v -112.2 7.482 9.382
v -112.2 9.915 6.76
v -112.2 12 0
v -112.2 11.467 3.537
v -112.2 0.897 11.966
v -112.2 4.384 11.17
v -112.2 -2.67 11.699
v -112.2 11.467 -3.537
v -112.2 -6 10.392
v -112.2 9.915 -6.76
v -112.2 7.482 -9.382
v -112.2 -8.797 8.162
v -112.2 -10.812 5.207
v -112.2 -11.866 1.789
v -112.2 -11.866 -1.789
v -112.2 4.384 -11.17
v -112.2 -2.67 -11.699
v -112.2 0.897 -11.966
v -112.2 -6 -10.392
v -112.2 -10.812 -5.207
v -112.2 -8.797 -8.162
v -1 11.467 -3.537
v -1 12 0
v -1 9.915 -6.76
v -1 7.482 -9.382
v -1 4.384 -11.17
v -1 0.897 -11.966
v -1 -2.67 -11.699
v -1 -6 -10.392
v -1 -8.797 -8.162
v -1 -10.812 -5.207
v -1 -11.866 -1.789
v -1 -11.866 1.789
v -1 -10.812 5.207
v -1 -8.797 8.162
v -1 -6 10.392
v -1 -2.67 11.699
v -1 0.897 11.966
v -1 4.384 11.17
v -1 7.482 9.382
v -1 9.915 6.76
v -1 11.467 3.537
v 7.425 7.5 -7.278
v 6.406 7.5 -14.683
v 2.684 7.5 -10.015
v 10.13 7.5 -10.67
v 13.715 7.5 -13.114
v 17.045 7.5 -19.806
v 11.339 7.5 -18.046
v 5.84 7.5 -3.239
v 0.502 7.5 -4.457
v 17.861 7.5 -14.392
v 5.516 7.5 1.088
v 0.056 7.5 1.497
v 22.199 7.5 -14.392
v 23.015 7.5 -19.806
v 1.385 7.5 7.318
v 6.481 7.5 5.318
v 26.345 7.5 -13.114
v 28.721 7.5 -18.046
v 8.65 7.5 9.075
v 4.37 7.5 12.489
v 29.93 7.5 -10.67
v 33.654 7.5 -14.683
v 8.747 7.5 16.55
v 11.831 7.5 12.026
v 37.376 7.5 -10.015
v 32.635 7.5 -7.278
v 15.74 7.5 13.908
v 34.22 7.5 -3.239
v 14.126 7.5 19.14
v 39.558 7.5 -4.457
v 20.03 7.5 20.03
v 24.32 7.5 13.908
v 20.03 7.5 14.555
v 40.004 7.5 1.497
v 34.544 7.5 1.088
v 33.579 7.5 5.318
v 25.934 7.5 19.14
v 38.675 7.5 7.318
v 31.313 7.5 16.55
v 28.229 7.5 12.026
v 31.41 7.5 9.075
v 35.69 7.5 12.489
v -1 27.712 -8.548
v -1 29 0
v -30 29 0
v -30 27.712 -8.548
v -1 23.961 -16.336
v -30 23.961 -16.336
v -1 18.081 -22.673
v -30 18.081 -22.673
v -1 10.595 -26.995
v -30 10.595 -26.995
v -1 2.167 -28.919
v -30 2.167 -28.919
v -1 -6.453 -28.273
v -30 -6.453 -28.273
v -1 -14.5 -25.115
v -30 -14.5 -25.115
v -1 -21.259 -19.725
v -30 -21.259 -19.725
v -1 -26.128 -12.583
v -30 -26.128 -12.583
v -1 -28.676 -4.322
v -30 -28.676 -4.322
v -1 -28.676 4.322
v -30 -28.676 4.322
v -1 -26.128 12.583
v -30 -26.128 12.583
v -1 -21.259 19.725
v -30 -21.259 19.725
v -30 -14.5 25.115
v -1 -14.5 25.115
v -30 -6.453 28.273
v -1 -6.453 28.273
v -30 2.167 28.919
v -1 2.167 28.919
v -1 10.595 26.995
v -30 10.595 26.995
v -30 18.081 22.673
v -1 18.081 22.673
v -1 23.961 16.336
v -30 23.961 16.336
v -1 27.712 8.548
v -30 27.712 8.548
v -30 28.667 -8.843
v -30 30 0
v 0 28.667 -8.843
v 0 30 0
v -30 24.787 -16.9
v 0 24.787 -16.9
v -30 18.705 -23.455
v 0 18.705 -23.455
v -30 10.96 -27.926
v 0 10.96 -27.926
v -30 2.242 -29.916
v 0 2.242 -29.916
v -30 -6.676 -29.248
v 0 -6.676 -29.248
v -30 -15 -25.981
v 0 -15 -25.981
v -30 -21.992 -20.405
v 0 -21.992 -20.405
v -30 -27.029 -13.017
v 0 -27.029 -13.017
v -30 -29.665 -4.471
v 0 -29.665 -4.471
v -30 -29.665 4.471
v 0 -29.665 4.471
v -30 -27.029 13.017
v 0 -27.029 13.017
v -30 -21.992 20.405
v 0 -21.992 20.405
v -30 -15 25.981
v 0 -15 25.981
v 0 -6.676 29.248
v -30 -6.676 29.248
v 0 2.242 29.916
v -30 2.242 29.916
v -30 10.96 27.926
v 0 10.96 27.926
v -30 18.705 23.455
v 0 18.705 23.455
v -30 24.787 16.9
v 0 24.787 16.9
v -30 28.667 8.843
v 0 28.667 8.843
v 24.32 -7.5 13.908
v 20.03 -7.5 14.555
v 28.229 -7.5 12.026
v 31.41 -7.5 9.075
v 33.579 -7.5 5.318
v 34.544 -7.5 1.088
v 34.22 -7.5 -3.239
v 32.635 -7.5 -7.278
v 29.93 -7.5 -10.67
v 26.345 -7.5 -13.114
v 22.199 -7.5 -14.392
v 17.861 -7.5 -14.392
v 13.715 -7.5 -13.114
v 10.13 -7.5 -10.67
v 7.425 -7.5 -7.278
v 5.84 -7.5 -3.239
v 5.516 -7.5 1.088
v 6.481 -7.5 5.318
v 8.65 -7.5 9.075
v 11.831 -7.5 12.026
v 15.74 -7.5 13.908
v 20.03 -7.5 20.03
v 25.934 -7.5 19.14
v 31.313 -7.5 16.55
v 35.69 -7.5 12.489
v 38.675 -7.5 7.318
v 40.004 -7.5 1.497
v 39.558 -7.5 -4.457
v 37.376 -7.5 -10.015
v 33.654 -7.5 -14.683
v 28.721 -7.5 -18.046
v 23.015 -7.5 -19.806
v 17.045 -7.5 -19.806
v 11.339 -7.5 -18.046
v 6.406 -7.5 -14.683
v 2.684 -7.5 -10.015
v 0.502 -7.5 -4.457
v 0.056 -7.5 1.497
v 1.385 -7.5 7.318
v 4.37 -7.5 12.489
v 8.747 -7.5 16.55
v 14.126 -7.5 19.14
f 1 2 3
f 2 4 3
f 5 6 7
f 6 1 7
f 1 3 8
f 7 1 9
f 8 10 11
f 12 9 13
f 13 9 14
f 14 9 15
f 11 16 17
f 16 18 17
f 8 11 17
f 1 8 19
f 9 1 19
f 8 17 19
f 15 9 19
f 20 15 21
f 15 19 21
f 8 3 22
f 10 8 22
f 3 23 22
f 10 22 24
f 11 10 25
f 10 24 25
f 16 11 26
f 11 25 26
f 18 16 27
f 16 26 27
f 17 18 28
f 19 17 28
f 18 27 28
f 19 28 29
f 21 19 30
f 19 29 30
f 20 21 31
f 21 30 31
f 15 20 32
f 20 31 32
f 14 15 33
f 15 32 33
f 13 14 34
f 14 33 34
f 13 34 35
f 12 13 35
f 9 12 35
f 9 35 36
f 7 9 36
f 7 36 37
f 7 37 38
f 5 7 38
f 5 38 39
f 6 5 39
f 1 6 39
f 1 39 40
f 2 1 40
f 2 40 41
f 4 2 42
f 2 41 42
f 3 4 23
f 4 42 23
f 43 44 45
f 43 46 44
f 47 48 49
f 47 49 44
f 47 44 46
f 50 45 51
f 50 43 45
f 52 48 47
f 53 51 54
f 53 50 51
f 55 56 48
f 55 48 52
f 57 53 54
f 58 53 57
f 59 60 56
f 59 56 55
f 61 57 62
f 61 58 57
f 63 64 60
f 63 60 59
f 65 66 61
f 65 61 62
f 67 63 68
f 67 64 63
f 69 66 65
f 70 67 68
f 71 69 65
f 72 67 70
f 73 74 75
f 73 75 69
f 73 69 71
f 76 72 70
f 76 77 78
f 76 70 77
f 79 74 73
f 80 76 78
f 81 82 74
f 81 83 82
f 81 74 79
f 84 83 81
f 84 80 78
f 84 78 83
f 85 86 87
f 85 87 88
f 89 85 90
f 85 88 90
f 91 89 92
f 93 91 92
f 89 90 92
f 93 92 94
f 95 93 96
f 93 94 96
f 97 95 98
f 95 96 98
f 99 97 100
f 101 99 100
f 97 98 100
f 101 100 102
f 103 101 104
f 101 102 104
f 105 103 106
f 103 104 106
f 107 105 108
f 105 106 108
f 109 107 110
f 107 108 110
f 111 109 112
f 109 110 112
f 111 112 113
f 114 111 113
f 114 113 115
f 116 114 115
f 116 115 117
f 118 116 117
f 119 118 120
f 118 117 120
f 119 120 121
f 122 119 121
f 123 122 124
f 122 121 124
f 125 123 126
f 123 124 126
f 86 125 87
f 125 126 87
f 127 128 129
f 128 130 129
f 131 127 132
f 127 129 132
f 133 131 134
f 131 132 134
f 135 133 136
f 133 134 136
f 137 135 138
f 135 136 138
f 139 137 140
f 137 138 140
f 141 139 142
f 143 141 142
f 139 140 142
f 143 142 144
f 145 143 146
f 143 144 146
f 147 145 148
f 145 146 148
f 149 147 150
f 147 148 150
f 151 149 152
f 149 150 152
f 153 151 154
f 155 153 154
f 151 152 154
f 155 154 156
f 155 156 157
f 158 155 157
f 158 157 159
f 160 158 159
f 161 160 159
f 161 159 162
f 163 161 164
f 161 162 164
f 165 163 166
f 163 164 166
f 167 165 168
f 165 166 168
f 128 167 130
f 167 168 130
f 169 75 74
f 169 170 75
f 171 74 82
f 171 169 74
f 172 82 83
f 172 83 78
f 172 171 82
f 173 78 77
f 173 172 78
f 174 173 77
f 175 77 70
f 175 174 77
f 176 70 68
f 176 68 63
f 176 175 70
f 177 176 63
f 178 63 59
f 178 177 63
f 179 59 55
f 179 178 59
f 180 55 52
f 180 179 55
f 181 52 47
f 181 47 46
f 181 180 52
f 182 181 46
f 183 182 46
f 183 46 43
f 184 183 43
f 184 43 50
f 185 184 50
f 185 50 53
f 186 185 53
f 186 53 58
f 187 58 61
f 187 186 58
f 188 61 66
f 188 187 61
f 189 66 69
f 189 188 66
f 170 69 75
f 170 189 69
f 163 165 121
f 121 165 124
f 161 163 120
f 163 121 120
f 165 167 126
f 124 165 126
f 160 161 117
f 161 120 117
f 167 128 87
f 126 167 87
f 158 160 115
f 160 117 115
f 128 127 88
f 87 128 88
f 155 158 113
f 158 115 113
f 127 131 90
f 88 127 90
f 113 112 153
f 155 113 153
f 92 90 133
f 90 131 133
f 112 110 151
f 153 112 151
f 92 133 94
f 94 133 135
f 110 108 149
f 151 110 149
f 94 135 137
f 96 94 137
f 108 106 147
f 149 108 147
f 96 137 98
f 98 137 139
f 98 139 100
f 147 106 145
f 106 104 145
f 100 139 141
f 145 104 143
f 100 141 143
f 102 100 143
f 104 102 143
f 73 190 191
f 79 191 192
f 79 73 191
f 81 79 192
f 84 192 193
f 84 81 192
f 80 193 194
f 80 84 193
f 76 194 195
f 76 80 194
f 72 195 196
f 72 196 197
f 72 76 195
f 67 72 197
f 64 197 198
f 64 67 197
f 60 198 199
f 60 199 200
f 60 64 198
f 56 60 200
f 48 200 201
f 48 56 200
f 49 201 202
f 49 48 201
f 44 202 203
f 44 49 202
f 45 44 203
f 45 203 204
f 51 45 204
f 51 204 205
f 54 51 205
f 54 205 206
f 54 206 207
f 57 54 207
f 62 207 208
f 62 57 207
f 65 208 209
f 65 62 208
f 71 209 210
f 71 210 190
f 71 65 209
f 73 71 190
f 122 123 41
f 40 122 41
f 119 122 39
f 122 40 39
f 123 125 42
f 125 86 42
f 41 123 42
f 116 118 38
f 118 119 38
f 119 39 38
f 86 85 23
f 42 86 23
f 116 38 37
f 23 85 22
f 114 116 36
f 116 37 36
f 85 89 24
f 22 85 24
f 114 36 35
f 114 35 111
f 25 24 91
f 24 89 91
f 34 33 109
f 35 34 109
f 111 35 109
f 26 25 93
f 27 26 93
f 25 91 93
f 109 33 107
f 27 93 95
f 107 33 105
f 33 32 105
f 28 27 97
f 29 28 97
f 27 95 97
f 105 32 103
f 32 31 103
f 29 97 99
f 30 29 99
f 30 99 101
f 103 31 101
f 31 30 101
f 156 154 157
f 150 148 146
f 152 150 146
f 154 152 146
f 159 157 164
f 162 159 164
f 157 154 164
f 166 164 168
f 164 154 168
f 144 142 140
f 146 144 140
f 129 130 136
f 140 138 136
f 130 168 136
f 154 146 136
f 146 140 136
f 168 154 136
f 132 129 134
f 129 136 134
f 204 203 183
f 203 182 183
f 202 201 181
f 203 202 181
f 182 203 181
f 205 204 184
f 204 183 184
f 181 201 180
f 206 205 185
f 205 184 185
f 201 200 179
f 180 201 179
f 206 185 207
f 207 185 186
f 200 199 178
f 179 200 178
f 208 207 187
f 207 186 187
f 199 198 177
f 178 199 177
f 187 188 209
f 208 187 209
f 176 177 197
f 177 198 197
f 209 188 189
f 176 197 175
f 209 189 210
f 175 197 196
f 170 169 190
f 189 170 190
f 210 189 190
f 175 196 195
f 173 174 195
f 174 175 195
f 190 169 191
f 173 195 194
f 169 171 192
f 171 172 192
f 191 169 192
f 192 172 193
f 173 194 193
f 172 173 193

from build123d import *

# Parameters (mm, degrees)
SKETCH2_R           = 20.03
SKETCH2_R_2         = 14.555
BOSS_EXTRUDE1_DEPTH = 7.5


with BuildPart() as part:
    # Sketch1 → Revolve1 (revolve)
    with BuildSketch(Plane.XY):
        Polygon((0, 0), (-112.2, 0), (-112.2, 12), (-1, 12), (-1, 29), (-30, 29), (-30, 30), (0, 30), align=None)
    revolve(axis=Axis((0, 0, 0), (-1, 0, 0)))


with BuildPart() as body_2:
    # Sketch2 → Boss-Extrude1 (new, symmetric)
    with BuildSketch(Plane(origin=(0, 0, 0), x_dir=(1, 0, 0), z_dir=(0, 1, 0))):
        with Locations(Location((20.03, 0, 0), (0, 0, 270))):
            Circle(SKETCH2_R)
        with Locations(Location((20.03, 0, 0), (0, 0, 270))):
            Circle(SKETCH2_R_2, mode=Mode.SUBTRACT)
    extrude(amount=BOSS_EXTRUDE1_DEPTH, both=True)


solid = Compound([part.part, body_2.part])
